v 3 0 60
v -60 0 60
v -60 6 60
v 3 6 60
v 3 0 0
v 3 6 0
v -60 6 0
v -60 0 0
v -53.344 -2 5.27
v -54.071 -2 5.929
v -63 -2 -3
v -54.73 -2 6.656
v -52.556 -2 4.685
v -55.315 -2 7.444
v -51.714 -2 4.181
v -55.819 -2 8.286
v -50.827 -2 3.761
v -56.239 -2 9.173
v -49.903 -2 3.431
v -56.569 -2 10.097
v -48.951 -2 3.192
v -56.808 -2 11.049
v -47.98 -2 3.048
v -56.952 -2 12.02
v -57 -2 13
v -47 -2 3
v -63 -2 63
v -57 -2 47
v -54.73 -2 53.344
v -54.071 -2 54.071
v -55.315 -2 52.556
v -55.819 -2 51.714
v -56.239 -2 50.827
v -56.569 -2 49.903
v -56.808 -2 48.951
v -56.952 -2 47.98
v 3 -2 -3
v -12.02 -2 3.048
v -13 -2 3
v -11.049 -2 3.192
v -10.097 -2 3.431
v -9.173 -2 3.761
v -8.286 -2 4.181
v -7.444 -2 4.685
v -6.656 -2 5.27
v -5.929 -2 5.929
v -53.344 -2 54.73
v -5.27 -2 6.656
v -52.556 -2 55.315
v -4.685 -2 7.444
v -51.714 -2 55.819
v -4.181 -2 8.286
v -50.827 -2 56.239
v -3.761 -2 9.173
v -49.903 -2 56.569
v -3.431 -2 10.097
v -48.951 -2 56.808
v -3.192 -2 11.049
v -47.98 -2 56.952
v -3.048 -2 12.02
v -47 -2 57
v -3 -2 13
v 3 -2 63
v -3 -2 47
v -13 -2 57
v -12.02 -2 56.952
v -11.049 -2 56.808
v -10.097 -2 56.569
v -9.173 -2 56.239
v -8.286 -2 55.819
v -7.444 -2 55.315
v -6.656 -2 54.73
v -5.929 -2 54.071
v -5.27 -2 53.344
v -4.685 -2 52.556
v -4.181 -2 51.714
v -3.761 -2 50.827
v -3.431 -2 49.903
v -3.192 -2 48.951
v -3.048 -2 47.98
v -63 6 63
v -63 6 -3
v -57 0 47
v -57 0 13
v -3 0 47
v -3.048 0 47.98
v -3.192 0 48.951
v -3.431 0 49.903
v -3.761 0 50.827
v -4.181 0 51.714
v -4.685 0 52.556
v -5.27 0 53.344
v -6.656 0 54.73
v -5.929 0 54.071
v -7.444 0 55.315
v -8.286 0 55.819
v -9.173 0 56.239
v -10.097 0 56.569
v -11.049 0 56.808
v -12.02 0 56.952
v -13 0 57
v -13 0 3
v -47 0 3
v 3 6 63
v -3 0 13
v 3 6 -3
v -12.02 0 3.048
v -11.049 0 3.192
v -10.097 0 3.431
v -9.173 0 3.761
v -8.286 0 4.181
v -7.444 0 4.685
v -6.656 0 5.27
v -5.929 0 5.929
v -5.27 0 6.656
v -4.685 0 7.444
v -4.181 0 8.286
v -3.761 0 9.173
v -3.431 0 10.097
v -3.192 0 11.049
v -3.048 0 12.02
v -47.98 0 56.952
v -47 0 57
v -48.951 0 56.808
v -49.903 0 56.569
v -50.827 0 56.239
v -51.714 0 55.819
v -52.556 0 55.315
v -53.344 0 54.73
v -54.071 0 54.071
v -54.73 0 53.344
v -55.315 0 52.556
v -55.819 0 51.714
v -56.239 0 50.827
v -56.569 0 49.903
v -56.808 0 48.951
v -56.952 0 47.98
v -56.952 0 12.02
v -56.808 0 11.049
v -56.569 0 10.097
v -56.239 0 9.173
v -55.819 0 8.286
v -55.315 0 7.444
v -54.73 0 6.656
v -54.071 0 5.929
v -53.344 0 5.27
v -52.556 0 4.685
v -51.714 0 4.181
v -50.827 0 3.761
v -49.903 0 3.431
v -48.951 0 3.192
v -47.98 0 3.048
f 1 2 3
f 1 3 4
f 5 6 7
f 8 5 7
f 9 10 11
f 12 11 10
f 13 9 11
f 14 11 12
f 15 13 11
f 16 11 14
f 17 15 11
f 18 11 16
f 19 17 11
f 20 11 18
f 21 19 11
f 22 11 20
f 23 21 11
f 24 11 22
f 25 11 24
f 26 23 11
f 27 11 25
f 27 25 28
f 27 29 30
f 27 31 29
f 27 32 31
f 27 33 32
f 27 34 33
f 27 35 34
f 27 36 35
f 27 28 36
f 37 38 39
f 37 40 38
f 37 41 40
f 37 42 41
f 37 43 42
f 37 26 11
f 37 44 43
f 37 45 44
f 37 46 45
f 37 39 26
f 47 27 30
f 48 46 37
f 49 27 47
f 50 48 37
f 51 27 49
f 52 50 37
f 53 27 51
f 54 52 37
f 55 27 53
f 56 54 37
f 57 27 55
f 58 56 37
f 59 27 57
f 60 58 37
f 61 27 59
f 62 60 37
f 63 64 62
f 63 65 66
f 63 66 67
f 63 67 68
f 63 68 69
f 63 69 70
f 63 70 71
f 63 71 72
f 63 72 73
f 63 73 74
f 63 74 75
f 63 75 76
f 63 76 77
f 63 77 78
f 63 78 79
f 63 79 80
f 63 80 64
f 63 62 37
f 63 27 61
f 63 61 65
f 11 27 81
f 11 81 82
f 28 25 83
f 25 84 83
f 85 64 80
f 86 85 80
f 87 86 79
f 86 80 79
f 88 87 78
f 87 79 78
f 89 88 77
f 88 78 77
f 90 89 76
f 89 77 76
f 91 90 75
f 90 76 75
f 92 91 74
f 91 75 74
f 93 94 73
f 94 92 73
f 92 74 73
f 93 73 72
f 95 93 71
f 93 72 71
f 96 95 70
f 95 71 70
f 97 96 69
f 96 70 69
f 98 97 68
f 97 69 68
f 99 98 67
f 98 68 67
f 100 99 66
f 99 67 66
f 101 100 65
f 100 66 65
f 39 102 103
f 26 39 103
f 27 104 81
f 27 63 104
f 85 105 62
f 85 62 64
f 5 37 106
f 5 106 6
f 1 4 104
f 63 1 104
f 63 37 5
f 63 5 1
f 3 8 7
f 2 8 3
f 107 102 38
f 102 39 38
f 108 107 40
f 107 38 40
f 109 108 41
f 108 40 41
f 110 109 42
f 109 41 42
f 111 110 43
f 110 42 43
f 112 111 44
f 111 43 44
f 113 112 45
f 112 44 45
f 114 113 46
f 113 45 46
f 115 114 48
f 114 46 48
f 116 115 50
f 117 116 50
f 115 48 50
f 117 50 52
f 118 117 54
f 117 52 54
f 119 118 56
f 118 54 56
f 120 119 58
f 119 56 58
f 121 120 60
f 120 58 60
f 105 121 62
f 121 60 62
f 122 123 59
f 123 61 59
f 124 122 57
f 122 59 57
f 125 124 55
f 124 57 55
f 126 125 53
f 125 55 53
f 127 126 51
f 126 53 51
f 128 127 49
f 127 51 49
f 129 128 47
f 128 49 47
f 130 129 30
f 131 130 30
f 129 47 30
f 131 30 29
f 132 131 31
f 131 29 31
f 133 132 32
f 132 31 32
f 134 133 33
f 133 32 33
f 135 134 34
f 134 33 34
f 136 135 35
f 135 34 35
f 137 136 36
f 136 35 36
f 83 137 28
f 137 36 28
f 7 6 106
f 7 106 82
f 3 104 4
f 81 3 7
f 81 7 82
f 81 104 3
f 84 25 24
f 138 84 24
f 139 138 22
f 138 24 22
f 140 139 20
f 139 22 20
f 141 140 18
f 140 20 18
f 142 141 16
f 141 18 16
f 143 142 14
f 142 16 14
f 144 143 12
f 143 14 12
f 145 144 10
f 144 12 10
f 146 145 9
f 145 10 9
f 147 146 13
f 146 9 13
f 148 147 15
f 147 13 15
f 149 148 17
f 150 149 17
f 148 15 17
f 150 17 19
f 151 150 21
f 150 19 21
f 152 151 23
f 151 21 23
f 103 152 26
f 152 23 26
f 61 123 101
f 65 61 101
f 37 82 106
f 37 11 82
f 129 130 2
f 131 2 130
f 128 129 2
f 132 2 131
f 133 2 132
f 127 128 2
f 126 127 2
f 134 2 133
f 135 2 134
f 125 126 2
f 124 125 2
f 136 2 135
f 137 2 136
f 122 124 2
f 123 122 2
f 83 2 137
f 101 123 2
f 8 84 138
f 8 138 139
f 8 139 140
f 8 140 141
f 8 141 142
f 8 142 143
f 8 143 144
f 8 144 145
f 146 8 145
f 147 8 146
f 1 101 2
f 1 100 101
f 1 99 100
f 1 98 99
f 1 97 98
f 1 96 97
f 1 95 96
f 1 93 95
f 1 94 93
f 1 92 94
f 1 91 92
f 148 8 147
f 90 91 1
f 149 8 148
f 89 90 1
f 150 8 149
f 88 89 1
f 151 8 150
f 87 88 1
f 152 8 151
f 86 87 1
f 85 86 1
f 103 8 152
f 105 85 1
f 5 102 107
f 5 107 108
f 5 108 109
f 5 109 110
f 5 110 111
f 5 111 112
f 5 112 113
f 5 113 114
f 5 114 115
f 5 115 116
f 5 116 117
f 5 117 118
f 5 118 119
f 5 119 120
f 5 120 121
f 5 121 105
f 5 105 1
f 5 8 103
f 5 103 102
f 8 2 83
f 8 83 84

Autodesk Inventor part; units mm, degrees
ref_plane "YZ Plane" through (0, 0, 0) normal (1, 0, 0) x (0, 1, 0)
ref_plane "XZ Plane" through (0, 0, 0) normal (0, 1, 0) x (-1, 0, 0)
ref_plane "XY Plane" through (0, 0, 0) normal (0, 0, 1) x (1, 0, 0)
sketch "Boceto1" plane through (0, 0, 0) normal (0, 1, 0) x (-1, 0, 0)
  line L0 (0, 0) -> (60, 0)
  line L1 (60, 0) -> (60, 60)
  line L2 (60, 60) -> (0, 60)
  line L3 (0, 60) -> (0, 0)
  line L4 (3, 57) -> (57, 57)
  line L5 (57, 57) -> (57, 3)
  line L6 (57, 3) -> (3, 3)
  line L7 (3, 3) -> (3, 57)
  line L8 (-3, 63) -> (63, 63)
  line L9 (63, 63) -> (63, -3)
  line L10 (63, -3) -> (-3, -3)
  line L11 (-3, -3) -> (-3, 63)
  dimension "d0" = 60
  dimension "d1" = 60
  dimension "d3" = 3
  dimension "d13" = 3
extrude "Extrusión1" add sketch "Boceto1" along normal blind 6 contours L8 L9 L10 L11
sketch "Boceto2" plane through (0, 0, 0) normal (0, -1, 0) x (1, 0, 0)
  line L0 (3, -3) -> (-63, -3) projected
  line L1 (3, 63) -> (3, -3) projected
  line L2 (-63, 63) -> (3, 63) projected
  line L3 (-63, -3) -> (-63, 63) projected
  line L4 (0, 0) -> (0, 60) projected
  line L5 (-60, 0) -> (0, 0) projected
  line L6 (-60, 60) -> (-60, 0) projected
  line L7 (0, 60) -> (-60, 60) projected
extrude "Extrusión2" add sketch "Boceto2" along normal blind 2 contours L0 L3 L2 L1 | L5 L6 L7 L4
sketch "Boceto3" plane through (0, 6, 0) normal (0, 1, 0) x (1, 0, 0)
  line L0 (0, 0) -> (0, -60) projected
  line L1 (0, -60) -> (3, -60)
  line L2 (3, -60) -> (3, 0)
  line L3 (3, 0) -> (0, 0)
  line L4 (0, 0) -> (0, -60)
extrude "Extrusión3" cut sketch "Boceto3" against normal up to surface (6 mm away)
sketch "Boceto4" plane through (0, 0, 0) normal (0, 1, 0) x (1, 0, 0)
  line L0 (-60, 0) -> (3, 0) projected
  line L1 (-60, -60) -> (-60, 0) projected
  line L2 (-60, -60) -> (3, -60) projected
  line L3 (3, 0) -> (3, -60) projected
  line L4 (3, -60) -> (0, -60)
  line L5 (0, -60) -> (0, 0)
  line L6 (0, -57) -> (0, -3)
  line L7 (0, -3) -> (-57, -3)
  line L8 (-57, -3) -> (-57, -57)
  line L9 (-57, -57) -> (0, -57)
  line L10 (-3, 0) -> (-3, -63)
  line L11 (-3, -63) -> (3, -63)
  point P0 (-3, -57)
  point P1 (-3, -3)
  dimension "d28" = 3
extrude "Extrusión4" cut sketch "Boceto4" against normal blind 10 contours L10 L9 L8 L7
fillet "Empalme1" radius 10 4 edges at (-3, -1, 57) (-3, -1, 3) (-57, -1, 3) (-57, -1, 57)
properties part number "Disco_inferior"
